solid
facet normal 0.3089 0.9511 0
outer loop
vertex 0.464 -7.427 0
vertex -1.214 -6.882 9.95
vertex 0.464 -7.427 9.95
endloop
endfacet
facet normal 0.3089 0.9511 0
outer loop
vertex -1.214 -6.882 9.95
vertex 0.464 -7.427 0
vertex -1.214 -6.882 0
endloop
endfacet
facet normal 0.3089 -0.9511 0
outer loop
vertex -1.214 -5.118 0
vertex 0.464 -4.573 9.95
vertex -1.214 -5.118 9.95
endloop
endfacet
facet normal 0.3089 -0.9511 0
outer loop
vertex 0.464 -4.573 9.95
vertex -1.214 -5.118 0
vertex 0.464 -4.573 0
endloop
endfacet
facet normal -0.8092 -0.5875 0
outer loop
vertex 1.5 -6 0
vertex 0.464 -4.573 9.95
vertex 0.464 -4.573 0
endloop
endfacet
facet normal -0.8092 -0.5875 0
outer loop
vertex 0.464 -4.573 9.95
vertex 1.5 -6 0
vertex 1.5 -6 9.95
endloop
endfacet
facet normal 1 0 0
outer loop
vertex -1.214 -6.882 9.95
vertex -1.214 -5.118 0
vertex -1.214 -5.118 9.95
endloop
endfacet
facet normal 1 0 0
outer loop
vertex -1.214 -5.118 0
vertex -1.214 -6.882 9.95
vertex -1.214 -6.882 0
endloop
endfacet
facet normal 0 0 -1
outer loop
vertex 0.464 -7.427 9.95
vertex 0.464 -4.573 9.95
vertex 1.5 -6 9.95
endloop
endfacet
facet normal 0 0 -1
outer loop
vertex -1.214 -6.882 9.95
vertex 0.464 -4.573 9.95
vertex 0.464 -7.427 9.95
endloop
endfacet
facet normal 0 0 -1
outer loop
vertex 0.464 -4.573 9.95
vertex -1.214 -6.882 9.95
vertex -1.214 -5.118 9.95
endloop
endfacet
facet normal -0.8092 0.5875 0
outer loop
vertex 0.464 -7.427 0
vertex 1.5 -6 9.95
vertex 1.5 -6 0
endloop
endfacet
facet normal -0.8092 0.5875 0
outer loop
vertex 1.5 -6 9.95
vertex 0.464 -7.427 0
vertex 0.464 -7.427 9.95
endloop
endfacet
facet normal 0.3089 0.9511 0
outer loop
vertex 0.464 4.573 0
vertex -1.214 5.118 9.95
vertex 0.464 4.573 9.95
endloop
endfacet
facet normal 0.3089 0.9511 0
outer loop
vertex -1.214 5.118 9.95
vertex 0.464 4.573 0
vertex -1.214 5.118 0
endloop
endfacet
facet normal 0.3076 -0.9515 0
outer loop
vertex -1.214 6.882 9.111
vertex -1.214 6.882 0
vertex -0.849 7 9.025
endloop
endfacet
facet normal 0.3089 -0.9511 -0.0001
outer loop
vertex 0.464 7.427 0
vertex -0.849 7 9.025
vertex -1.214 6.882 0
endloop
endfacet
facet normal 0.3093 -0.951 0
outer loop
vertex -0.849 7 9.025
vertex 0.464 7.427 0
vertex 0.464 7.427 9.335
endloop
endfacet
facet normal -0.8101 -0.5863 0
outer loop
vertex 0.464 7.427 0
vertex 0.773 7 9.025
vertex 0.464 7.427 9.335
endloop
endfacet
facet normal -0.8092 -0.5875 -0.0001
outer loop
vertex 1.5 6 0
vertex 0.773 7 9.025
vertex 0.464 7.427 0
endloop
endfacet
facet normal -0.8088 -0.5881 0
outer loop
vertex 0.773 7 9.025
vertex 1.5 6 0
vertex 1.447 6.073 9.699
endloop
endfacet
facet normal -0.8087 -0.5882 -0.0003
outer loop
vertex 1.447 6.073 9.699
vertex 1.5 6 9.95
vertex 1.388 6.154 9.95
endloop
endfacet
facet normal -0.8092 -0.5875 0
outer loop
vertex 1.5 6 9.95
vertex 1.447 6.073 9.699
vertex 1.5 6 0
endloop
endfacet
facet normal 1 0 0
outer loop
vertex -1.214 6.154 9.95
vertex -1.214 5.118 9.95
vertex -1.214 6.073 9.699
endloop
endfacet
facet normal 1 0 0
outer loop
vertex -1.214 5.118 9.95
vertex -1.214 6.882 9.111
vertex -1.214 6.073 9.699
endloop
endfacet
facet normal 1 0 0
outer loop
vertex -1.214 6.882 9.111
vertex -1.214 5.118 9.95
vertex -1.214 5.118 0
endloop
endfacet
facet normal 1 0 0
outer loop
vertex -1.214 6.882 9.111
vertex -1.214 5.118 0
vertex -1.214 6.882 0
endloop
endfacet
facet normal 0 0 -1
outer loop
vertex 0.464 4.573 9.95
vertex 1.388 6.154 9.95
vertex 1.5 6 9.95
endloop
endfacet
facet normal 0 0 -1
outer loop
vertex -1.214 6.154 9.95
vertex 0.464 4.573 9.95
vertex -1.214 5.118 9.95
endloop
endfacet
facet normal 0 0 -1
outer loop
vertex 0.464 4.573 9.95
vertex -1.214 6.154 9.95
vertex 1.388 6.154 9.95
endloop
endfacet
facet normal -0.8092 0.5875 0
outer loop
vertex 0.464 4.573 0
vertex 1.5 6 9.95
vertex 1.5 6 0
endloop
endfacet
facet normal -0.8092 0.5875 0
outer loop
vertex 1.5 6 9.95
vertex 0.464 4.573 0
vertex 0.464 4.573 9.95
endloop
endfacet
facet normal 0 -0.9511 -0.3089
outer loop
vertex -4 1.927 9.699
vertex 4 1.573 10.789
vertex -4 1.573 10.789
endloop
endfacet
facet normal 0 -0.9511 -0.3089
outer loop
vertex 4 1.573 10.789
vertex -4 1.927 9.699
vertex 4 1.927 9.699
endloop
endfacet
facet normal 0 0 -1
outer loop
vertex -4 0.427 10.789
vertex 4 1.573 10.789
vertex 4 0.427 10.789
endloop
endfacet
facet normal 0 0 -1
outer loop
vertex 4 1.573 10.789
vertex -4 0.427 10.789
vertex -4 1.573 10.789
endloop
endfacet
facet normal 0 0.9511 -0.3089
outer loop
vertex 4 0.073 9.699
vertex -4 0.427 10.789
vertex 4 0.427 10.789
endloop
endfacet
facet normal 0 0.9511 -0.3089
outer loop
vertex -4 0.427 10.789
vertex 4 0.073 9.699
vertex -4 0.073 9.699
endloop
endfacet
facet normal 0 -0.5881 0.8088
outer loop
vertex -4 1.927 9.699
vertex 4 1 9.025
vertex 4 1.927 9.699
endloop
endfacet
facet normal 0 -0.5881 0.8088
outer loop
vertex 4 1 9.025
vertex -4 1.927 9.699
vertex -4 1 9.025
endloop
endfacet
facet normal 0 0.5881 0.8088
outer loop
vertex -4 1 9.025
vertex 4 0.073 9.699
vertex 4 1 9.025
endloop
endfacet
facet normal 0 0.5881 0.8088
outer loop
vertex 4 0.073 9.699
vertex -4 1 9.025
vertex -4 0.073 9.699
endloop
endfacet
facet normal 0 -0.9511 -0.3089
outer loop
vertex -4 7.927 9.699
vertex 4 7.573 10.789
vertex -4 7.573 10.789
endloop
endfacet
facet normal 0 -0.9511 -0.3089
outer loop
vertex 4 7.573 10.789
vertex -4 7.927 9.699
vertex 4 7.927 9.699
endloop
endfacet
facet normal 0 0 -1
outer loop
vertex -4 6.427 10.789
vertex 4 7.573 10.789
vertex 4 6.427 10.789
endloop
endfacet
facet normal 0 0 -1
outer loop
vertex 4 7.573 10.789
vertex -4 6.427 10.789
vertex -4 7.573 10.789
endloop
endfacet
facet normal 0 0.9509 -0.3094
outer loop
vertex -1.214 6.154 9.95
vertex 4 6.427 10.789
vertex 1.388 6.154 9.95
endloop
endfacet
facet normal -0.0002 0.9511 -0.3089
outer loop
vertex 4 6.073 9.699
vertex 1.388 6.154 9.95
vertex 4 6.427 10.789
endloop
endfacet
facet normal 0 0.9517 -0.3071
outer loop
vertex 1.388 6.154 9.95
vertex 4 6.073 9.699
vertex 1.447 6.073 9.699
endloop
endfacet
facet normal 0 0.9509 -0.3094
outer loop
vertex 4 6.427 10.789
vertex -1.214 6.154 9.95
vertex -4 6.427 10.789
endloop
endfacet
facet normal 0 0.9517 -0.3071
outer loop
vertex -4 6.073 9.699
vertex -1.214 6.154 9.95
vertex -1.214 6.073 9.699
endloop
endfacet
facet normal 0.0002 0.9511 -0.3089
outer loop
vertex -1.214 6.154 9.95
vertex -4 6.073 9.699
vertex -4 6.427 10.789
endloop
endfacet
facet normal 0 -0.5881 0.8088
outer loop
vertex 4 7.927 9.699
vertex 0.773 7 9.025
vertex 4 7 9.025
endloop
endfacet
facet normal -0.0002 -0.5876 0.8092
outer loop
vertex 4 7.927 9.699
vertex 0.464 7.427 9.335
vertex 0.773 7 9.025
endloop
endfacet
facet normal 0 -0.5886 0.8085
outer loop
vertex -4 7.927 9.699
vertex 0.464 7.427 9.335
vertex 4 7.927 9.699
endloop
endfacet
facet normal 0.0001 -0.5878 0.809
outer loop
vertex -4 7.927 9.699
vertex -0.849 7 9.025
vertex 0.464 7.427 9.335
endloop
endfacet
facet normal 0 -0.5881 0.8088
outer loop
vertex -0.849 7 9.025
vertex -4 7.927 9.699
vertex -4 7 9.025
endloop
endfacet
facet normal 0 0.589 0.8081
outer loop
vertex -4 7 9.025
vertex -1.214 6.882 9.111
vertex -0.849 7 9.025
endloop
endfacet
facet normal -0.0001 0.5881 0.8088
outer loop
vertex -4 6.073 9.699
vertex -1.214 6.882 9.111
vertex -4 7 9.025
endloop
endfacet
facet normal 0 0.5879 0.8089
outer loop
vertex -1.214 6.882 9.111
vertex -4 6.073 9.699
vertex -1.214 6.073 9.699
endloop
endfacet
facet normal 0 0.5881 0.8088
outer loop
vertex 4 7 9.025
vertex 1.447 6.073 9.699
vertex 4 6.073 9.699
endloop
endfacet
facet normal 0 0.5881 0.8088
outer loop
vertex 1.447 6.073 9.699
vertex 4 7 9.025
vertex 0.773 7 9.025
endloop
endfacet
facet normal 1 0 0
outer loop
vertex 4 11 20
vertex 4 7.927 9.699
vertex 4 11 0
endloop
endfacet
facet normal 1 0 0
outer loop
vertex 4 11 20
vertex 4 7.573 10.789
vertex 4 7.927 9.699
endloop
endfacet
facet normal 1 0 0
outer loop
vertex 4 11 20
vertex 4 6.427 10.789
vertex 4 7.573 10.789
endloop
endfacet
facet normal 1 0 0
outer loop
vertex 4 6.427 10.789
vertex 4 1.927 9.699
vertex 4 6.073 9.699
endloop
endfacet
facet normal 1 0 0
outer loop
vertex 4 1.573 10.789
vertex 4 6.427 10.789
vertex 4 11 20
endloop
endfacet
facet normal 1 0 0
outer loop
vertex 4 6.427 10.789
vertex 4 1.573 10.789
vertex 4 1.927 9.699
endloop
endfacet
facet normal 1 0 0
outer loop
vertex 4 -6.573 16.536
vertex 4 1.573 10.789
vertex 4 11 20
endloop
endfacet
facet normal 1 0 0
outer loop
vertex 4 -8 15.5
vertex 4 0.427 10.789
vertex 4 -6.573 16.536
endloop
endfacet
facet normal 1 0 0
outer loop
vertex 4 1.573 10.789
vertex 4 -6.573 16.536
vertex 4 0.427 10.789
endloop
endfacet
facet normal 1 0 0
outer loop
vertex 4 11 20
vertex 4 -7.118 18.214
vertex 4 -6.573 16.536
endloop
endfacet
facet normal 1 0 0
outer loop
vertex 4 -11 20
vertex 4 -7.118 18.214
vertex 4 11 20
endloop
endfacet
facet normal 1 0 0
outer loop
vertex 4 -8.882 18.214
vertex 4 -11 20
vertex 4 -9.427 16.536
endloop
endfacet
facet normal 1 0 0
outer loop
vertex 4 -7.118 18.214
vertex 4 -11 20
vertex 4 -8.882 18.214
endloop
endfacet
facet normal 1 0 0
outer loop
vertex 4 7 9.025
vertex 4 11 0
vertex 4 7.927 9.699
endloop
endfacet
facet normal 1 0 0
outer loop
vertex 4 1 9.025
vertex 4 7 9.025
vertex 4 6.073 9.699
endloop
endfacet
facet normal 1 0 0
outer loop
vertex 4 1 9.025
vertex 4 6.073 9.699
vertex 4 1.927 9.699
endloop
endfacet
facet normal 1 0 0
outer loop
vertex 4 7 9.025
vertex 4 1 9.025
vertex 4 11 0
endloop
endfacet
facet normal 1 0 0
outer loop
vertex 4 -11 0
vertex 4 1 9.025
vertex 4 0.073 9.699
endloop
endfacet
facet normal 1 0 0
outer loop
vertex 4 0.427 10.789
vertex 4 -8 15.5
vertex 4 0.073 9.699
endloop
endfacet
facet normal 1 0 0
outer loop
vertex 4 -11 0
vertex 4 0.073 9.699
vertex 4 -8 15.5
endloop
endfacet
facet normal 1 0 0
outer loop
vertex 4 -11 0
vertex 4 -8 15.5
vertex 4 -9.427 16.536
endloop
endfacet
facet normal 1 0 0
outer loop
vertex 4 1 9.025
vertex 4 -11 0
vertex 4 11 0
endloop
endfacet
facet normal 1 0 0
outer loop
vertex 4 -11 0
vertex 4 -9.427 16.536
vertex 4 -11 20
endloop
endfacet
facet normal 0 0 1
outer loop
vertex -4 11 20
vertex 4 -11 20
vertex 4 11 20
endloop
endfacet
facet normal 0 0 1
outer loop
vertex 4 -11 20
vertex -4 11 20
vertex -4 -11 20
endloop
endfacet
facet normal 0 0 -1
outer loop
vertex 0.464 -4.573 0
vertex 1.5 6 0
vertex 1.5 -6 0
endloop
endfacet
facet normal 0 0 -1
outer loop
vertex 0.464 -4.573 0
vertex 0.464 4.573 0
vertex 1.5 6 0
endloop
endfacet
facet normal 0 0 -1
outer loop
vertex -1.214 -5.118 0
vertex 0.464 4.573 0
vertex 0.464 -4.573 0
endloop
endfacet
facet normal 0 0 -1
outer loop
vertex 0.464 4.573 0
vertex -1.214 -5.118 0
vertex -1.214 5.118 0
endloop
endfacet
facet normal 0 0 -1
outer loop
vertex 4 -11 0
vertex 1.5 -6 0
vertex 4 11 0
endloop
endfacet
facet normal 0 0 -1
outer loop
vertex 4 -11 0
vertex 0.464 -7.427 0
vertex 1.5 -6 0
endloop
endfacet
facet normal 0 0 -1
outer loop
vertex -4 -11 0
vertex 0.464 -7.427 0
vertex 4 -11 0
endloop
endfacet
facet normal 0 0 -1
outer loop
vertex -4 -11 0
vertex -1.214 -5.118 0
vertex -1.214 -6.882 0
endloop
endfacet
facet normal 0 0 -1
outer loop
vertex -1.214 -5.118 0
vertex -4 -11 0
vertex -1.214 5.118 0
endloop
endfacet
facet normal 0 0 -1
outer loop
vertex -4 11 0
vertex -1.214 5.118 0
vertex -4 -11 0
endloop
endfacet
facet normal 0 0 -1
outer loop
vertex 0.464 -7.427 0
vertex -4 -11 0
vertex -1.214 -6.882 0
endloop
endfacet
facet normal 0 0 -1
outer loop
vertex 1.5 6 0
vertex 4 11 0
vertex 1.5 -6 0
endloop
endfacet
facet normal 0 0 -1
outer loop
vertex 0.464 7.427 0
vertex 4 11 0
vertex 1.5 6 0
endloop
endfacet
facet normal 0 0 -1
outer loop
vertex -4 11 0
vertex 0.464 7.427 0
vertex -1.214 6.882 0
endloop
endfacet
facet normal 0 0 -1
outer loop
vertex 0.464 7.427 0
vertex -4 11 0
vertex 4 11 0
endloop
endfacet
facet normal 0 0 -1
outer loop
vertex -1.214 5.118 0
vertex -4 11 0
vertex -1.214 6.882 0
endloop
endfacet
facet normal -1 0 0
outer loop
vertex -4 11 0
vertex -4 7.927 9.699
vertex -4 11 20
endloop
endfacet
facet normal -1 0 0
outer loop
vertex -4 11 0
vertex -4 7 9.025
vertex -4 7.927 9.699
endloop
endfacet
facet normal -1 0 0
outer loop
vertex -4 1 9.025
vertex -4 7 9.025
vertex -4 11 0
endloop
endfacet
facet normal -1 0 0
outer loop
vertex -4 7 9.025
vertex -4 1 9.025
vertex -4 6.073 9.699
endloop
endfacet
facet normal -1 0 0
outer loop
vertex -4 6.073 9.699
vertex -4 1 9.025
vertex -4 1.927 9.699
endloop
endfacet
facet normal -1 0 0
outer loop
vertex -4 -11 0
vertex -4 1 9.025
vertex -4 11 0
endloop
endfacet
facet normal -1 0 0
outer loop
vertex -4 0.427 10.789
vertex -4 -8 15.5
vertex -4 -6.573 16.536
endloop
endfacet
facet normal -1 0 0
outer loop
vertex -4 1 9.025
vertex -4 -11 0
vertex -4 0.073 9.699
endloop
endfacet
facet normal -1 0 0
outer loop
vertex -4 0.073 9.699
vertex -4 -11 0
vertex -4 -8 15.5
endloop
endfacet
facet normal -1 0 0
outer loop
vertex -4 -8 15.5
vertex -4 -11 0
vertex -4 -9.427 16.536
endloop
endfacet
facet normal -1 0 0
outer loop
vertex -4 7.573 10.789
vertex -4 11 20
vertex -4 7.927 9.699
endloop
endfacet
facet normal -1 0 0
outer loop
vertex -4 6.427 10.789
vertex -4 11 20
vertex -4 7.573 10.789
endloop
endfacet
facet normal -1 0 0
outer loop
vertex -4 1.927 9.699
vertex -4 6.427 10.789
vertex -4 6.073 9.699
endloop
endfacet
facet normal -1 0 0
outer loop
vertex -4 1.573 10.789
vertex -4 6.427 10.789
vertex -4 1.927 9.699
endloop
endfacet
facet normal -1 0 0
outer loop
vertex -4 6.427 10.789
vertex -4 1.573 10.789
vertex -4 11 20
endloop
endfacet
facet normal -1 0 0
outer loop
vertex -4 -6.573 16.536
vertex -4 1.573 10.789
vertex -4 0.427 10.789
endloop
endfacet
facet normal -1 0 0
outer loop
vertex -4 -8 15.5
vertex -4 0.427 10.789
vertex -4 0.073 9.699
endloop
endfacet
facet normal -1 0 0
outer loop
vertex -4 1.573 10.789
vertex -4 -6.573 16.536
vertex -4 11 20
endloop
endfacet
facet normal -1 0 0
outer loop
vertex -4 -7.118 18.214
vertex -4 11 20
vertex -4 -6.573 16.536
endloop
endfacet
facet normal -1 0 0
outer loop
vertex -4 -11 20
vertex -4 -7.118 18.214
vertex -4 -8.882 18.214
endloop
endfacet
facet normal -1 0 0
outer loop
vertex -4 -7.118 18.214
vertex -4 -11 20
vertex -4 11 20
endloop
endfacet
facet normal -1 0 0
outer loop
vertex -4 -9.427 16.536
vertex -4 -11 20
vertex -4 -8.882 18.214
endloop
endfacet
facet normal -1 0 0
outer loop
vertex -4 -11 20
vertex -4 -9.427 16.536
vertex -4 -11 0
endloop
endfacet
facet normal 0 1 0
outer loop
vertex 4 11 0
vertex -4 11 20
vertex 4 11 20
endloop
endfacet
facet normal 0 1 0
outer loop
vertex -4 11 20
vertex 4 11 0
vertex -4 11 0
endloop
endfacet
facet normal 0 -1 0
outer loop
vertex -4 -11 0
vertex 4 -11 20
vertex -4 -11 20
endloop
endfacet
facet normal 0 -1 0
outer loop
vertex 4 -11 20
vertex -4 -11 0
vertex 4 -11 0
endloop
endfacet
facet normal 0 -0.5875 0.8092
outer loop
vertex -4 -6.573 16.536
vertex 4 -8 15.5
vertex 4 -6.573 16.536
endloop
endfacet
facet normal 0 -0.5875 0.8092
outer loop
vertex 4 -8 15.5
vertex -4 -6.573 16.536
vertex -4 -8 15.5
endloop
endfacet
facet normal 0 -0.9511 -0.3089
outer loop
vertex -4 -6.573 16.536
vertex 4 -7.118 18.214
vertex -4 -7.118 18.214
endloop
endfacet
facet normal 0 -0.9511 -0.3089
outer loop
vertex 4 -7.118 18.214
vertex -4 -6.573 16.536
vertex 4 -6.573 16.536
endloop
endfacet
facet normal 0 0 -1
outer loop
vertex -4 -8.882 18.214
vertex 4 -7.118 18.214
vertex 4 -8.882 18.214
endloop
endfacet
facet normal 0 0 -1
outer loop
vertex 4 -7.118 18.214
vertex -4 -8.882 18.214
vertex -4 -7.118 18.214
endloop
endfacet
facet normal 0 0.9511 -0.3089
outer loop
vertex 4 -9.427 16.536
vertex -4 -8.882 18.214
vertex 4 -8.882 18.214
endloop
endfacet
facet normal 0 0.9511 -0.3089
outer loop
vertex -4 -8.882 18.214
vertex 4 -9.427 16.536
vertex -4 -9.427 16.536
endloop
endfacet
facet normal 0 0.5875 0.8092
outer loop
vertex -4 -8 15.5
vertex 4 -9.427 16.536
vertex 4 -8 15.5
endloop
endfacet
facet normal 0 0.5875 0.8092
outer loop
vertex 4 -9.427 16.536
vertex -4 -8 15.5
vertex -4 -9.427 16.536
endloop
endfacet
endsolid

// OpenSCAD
// file: dimensions.scad
width = 264;
depth = 80;

side_block_size = 10;

plate_mounting_screw_size = 3;
plate_mounting_screw_centres = 45;

switch_mounting_screw_size = 3;
switch_mounting_screw_centres = 12;

switch_arm_mounting_screw_size = 3;
// main file
include <dimensions.scad>

size = [8, 22, 20];
switch_mounting_screw_diameter = 1.95;

module SwitchBlock() {
  difference() {
    // Body
    translate([0, 0, size[2] / 2]) {
      cube(size, center=true);
    }

    // Bottom/plate mounting holes
    for(y = [-switch_mounting_screw_centres / 2, switch_mounting_screw_centres / 2]) {
      translate([0, y, -0.05]) {
        cylinder(h = 10, d = switch_mounting_screw_size, $fn = 5);
      }
    }

    // Side/switch mounting holes
    for(p = [[10, 1], [10, 7]]) {
      translate([0, p[1], p[0]]) {
        rotate([0, 90, 0]) {
          cylinder(h = size[0] + 0.1, d = switch_mounting_screw_diameter, center = true, $fn = 5);
        }
      }
    }

    // Arm mounting hole
    translate([0, -8, 17]) {
      rotate([0, 90, 0]) {
        cylinder(h = size[0] + 0.1, d = switch_arm_mounting_screw_size, center = true, $fn = 5);
      }
    }
  }
}

SwitchBlock();
